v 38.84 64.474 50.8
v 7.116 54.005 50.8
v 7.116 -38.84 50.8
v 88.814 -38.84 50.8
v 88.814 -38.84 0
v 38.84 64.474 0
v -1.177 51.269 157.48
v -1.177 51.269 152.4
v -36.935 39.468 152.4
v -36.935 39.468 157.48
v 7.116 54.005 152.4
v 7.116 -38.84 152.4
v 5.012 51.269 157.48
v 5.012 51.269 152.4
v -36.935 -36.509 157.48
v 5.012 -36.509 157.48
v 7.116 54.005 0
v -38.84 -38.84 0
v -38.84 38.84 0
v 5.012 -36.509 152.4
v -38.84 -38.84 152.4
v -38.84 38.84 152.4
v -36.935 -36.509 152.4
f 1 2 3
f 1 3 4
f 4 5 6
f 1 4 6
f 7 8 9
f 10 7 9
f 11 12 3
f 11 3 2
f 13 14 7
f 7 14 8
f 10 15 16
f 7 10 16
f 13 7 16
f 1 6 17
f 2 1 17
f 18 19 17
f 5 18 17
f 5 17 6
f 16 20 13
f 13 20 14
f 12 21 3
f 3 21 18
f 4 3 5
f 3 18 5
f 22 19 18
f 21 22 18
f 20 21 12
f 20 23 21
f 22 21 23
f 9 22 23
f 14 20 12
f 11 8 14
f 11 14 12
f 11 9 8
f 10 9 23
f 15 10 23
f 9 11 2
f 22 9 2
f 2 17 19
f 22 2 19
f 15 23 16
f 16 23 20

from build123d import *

# Parameters (mm, degrees)
F1_DEPTH = 152.4
F2_DEPTH = 50.8
F4_DEPTH = 5.08


with BuildPart() as f1:
    # F0 (on Top) → F1 (new body)
    with BuildSketch(Plane.XY):
        Polygon((-38.839806, 38.839806), (-38.839806, -38.839806), (7.116021, -38.839806), (7.116021, 54.005228), align=None)
    extrude(amount=F1_DEPTH)

    # F0 (on Top) → F2 (join)
    with BuildSketch(Plane.XY):
        Polygon((7.116021, 54.005228), (7.116021, -38.839806), (38.839806, -38.839806), (88.813685, -38.839806), (38.839806, 64.474076), align=None)
    extrude(amount=F2_DEPTH)

    # F3 (on face) → F4 (join)
    with BuildSketch(Plane.XY.offset(152.4)):
        Polygon((5.012183, -36.509417), (5.012183, 51.268544), (-1.17696, 51.268544), (-36.934808, 39.468455), (-36.934808, -36.509417), align=None)
    extrude(amount=F4_DEPTH)


solid = f1.part
